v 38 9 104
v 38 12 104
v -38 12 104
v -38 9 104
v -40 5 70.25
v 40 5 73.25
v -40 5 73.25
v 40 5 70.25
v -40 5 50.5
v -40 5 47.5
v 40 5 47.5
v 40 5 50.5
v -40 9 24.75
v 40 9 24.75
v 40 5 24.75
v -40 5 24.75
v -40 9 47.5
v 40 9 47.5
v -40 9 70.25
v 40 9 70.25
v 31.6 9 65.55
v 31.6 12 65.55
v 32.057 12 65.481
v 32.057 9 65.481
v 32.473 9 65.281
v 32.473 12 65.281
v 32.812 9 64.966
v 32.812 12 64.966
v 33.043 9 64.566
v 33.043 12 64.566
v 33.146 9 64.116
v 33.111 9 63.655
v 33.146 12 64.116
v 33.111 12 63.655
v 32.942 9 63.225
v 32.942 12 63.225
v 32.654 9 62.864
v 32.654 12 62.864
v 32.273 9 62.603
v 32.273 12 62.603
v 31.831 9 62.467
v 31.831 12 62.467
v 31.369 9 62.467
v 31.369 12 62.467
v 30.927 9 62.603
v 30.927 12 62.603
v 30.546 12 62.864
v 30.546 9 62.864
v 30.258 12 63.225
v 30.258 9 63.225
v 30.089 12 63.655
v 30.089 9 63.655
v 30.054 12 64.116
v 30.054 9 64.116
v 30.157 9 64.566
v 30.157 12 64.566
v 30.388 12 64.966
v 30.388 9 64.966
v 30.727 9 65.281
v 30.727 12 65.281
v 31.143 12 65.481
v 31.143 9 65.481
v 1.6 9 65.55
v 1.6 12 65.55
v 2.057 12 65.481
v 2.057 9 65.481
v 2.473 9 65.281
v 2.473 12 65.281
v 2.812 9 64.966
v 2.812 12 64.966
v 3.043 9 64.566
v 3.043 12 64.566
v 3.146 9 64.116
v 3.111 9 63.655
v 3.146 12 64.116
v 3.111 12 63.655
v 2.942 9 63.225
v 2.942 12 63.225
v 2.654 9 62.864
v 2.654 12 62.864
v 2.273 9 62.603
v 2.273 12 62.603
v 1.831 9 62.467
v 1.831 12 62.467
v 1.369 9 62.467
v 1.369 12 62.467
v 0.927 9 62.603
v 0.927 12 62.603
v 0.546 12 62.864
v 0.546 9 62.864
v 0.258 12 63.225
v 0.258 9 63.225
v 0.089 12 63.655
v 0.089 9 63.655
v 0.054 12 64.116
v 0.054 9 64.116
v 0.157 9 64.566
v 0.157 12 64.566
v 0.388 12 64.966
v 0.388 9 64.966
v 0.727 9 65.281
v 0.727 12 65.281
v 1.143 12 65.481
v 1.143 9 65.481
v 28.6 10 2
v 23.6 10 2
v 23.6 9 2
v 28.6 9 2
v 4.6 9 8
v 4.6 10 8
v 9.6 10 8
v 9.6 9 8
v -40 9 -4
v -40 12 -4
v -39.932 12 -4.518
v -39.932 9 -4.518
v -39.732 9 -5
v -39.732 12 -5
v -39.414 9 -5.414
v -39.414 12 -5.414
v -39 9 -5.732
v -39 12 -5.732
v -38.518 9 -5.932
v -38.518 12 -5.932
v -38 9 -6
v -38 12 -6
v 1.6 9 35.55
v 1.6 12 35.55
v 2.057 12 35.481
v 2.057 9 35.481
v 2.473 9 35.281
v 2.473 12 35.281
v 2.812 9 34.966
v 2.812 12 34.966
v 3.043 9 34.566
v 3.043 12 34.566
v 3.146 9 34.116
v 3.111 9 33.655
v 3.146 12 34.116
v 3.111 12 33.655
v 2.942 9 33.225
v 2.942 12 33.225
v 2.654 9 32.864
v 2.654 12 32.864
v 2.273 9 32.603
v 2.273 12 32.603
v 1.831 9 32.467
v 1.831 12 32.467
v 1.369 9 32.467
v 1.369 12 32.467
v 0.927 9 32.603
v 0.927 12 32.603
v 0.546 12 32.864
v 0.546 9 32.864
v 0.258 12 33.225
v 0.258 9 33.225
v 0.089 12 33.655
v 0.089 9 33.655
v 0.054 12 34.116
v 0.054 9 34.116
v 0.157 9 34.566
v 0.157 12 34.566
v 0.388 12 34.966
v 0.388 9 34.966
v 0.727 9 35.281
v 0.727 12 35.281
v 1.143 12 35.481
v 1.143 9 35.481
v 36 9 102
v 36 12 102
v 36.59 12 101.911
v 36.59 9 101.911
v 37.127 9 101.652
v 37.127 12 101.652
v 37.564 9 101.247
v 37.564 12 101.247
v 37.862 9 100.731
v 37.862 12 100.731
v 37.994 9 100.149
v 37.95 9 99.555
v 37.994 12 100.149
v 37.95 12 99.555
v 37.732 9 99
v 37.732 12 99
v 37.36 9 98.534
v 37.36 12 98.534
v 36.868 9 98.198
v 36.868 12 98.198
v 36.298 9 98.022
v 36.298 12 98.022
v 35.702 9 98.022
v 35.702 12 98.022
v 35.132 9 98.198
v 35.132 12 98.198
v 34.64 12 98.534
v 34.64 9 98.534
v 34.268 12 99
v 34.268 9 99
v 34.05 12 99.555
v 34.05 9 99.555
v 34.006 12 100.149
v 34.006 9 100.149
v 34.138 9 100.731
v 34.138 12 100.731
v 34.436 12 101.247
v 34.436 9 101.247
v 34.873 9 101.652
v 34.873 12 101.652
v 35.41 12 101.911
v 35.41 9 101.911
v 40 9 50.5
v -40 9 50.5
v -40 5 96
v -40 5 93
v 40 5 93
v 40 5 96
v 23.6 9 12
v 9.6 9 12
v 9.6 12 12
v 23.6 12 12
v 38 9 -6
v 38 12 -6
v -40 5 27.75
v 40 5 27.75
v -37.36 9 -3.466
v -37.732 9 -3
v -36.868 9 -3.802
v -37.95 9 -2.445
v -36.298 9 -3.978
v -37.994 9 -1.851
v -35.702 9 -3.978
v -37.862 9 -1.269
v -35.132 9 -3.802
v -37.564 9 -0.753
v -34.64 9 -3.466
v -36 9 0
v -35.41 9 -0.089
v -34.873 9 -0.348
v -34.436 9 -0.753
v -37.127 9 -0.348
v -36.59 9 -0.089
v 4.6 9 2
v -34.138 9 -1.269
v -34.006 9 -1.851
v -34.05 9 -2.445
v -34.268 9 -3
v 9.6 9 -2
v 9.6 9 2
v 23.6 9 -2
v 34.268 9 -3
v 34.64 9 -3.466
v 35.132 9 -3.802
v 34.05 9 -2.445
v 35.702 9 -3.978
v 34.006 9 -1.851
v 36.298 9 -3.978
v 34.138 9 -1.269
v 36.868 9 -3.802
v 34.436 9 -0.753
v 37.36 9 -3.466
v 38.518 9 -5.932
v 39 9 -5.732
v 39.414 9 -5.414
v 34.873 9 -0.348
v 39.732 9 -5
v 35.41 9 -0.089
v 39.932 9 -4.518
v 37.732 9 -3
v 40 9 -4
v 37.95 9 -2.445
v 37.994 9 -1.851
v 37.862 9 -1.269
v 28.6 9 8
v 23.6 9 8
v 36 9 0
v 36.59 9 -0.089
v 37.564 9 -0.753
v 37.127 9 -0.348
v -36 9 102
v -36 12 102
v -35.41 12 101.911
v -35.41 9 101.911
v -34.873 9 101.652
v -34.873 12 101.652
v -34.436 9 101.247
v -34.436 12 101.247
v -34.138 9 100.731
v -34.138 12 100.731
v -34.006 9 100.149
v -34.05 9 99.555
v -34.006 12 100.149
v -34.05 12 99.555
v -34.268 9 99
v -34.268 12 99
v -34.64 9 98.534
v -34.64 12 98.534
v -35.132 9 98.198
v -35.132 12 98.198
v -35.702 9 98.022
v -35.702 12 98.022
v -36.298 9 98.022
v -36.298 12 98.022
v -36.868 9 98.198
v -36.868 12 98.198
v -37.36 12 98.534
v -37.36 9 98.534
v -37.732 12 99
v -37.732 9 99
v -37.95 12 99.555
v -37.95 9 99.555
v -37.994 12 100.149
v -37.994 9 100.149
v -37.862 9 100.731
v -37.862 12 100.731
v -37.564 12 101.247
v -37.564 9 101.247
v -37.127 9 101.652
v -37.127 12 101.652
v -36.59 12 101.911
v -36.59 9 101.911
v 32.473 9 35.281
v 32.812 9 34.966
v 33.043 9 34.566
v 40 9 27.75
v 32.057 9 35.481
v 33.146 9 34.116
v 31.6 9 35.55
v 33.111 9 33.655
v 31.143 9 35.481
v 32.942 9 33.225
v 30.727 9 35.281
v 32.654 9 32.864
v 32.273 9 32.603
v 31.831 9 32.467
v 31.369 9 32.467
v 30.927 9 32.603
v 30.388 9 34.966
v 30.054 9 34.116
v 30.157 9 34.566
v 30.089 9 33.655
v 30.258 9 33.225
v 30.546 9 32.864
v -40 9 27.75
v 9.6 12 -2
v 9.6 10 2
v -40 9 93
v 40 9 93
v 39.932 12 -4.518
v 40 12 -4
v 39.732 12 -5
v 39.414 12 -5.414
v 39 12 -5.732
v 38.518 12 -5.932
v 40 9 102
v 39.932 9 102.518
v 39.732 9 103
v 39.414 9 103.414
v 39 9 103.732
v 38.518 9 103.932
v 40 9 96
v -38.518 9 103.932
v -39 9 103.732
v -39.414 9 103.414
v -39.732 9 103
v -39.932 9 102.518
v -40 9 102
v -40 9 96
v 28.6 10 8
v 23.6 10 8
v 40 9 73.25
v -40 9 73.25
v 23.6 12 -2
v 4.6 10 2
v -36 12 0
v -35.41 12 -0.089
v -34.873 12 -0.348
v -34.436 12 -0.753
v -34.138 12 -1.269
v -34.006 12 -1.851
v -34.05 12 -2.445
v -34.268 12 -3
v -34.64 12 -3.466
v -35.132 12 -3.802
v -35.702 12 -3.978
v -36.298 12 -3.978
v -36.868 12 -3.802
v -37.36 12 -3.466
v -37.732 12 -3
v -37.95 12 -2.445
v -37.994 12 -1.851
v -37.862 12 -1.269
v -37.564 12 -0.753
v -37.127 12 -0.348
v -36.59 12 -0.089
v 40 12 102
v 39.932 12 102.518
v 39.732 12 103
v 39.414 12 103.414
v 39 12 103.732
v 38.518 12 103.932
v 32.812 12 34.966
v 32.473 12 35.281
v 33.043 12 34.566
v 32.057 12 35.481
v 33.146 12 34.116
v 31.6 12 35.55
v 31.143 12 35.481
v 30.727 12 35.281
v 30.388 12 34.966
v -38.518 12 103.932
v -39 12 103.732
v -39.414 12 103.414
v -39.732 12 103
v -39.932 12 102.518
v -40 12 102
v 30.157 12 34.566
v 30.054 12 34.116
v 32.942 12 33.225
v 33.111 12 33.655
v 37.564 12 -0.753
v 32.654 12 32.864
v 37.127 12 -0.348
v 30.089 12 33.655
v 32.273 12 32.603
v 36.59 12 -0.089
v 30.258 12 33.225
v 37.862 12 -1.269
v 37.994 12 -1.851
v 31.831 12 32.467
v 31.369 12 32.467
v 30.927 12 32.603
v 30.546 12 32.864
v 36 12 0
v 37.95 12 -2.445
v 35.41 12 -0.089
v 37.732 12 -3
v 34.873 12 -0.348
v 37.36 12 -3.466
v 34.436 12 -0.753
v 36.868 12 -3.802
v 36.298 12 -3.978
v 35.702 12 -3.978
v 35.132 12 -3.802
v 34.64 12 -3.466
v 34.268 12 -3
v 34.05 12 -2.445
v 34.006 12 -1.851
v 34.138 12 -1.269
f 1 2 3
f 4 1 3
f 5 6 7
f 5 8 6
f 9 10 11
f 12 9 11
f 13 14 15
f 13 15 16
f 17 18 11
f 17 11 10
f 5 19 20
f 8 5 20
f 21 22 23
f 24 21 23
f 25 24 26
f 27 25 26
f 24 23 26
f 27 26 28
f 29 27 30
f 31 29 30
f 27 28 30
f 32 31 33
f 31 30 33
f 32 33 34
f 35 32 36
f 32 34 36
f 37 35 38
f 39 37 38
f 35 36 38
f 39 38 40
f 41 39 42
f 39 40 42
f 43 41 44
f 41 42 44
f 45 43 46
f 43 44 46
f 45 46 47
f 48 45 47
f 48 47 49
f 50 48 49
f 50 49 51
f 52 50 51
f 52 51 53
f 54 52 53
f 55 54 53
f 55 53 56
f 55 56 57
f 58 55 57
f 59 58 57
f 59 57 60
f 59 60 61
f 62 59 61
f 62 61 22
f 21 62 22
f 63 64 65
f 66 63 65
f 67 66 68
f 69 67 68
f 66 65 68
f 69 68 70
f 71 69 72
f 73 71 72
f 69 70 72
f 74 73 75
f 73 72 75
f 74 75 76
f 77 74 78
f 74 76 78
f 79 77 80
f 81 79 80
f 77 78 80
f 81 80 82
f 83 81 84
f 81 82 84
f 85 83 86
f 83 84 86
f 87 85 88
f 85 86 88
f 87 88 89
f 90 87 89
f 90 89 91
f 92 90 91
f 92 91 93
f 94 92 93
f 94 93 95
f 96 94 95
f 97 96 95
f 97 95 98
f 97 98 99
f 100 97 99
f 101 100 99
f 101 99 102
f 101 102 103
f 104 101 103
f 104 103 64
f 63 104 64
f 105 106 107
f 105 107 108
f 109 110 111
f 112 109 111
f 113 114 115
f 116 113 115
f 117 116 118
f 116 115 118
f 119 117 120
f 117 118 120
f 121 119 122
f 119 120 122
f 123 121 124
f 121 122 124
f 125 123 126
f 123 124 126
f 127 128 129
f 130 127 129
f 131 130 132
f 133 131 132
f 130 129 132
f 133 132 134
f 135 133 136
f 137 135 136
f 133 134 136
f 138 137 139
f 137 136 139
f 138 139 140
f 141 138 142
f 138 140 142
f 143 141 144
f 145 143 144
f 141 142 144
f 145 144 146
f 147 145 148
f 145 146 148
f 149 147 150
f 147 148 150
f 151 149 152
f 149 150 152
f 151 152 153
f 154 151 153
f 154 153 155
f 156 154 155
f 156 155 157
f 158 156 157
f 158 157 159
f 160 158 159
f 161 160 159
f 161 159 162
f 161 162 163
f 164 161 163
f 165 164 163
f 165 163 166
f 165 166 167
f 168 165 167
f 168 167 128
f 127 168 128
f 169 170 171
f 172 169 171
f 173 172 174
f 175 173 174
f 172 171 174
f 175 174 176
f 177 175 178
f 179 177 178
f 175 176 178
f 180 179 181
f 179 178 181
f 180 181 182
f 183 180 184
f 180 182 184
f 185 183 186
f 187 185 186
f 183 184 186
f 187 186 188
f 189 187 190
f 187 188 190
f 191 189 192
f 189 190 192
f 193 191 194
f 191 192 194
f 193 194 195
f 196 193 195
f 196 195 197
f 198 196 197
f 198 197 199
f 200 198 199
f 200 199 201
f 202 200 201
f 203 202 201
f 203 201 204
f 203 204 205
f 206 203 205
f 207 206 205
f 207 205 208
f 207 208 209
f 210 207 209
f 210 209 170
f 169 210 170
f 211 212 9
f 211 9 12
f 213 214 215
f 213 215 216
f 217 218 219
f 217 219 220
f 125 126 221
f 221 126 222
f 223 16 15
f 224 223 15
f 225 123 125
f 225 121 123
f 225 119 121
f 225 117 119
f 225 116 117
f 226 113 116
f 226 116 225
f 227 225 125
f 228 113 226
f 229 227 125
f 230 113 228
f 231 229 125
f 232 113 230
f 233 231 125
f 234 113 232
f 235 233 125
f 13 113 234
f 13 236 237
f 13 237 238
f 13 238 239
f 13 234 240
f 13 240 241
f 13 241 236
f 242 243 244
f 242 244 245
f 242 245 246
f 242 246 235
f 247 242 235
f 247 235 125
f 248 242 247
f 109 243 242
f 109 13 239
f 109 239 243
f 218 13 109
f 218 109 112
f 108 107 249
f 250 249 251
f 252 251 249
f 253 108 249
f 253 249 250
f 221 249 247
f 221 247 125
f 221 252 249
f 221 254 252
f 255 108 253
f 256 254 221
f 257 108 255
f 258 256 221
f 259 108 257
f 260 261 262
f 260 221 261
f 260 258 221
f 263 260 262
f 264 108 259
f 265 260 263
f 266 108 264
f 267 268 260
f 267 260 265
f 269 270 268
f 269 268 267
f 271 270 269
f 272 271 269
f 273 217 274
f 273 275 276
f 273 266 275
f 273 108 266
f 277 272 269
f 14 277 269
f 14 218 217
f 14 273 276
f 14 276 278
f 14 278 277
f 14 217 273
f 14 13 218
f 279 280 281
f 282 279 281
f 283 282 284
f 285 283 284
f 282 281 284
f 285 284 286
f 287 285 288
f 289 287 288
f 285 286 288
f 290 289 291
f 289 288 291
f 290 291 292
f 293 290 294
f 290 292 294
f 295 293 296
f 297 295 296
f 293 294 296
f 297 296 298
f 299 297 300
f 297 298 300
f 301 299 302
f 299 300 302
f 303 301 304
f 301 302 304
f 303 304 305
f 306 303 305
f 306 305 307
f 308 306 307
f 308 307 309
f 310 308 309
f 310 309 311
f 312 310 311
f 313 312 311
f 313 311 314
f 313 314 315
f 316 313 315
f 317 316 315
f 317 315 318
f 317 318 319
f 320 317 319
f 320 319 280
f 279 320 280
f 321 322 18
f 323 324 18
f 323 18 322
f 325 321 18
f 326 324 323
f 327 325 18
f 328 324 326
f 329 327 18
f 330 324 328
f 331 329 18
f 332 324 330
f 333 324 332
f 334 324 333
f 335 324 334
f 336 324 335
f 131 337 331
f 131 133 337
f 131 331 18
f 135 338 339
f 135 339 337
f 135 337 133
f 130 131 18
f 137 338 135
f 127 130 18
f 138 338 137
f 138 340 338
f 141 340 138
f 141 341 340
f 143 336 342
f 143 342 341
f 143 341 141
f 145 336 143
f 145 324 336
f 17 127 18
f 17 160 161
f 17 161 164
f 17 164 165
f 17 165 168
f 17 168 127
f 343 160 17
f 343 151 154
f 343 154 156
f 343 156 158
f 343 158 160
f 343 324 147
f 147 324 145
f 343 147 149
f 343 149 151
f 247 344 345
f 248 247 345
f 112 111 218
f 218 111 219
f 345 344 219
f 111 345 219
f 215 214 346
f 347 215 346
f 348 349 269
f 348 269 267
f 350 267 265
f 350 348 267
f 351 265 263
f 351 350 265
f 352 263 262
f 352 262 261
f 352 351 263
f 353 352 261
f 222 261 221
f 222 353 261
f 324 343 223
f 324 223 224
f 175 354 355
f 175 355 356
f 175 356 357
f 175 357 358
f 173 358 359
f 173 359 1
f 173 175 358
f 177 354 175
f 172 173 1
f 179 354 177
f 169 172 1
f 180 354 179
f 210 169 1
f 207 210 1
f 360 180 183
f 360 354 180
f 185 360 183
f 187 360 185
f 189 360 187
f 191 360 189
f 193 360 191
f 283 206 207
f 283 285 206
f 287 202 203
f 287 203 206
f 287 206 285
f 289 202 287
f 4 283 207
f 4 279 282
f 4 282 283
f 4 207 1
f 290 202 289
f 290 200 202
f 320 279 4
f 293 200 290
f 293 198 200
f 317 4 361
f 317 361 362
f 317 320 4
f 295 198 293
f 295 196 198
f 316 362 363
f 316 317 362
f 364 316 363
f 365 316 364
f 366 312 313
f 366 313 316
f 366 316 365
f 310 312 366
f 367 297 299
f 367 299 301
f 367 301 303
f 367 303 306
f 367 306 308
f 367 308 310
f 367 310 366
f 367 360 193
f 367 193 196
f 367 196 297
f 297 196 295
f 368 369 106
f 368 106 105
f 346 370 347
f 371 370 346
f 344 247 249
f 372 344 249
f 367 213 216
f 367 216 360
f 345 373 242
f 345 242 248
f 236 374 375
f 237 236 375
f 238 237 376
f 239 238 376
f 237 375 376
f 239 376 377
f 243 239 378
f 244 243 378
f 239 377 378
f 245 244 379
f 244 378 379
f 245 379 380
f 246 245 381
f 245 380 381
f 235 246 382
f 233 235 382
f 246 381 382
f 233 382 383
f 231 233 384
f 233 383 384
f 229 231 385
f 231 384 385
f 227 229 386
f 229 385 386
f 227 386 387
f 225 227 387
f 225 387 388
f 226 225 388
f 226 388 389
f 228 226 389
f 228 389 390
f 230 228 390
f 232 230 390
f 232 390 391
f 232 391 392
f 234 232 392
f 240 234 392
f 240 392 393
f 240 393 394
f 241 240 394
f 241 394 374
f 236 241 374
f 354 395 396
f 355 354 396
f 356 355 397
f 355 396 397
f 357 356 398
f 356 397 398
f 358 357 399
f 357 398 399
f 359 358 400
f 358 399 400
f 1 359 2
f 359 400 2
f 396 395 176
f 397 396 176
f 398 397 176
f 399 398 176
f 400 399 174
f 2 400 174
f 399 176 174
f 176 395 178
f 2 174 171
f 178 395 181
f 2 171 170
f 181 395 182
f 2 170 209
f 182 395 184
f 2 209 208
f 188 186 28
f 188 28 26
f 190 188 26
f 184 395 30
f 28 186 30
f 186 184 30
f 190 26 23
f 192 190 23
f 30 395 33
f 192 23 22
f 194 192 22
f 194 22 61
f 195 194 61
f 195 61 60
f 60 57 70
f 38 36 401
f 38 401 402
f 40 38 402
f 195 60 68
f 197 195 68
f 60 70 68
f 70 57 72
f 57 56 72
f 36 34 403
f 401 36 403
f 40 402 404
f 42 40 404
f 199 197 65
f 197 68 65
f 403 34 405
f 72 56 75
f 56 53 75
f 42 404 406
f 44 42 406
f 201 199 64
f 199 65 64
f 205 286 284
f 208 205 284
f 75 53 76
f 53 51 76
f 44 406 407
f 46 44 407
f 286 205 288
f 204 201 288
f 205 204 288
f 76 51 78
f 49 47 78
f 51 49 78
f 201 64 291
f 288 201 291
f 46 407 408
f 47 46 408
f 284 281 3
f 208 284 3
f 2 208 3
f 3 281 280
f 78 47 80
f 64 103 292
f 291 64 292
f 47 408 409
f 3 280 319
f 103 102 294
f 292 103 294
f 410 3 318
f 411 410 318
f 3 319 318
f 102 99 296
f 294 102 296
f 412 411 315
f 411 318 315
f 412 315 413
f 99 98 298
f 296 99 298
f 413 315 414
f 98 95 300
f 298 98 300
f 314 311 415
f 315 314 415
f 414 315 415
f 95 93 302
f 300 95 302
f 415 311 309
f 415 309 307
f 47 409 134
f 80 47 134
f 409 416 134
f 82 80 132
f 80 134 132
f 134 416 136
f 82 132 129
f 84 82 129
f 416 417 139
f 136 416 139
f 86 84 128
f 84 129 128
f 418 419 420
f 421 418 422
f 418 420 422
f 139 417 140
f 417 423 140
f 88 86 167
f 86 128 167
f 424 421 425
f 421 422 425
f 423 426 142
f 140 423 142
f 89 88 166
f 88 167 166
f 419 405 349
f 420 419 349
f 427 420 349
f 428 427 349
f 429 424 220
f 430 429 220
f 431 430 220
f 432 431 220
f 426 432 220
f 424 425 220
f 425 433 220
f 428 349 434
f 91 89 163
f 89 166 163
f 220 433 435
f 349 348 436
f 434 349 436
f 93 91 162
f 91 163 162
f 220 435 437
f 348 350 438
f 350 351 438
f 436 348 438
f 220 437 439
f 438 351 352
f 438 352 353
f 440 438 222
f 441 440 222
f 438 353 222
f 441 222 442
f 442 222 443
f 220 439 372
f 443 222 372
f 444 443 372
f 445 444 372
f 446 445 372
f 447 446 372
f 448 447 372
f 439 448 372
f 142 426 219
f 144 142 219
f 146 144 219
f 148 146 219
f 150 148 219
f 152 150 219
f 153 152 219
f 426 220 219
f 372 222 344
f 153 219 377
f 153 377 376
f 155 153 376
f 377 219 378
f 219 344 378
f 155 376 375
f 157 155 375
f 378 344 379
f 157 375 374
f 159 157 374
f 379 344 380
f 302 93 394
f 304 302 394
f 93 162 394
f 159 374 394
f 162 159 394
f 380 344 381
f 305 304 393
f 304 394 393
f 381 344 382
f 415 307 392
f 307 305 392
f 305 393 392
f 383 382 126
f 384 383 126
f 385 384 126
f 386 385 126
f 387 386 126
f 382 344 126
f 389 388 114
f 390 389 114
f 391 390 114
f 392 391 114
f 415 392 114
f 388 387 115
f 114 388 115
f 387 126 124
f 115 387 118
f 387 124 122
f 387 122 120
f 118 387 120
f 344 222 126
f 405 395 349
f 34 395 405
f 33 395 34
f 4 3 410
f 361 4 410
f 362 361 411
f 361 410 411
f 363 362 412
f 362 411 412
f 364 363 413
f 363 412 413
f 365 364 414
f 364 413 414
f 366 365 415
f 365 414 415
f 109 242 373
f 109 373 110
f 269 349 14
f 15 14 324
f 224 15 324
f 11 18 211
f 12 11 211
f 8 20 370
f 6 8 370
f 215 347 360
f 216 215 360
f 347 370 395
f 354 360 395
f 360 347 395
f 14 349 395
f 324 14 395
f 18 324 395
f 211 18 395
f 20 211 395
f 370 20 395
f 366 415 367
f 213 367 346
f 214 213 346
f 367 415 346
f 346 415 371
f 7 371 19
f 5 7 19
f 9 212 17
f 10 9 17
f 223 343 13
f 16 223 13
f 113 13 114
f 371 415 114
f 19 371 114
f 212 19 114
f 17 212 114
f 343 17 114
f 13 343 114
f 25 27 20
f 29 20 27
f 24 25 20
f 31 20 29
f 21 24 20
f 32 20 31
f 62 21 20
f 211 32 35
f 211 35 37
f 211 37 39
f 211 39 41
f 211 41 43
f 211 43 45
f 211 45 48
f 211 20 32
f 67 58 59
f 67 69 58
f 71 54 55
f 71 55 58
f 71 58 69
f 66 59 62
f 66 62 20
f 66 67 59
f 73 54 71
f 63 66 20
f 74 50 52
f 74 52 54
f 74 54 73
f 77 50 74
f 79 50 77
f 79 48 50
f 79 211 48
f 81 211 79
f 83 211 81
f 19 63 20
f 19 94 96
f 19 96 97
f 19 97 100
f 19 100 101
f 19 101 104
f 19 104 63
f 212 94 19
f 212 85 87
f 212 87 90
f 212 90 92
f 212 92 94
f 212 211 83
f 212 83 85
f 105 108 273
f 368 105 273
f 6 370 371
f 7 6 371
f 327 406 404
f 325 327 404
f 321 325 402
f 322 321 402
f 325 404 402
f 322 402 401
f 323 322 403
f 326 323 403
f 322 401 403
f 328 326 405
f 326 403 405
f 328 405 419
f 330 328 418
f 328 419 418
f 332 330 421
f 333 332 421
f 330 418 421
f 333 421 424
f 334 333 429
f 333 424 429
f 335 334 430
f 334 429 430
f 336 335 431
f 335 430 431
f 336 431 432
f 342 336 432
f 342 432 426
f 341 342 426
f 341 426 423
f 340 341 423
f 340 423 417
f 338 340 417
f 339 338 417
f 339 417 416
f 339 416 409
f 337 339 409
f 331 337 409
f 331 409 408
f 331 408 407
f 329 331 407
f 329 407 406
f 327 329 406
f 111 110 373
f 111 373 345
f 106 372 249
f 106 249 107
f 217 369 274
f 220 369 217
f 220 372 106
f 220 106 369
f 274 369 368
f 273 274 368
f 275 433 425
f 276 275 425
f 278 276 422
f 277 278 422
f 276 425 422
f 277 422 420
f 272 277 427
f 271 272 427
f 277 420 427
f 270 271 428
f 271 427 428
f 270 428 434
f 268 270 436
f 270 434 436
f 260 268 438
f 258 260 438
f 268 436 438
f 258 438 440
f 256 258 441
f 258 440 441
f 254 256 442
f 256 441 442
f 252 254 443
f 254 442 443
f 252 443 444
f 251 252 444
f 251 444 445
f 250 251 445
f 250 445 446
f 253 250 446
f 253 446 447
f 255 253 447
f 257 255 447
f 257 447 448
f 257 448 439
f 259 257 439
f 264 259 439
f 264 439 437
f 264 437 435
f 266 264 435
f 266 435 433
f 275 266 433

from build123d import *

# Parameters (mm, degrees)
EXTRUDE_1_DEPTH      = 12
CUT_EXTRUDE_1_DEPTH  = 12
SKETCH_3_R           = 2
CUT_EXTRUDE_2_DEPTH  = 12
CUT_EXTRUDE_3_DEPTH  = 1
SKETCH_5_W           = 80
SKETCH_5_H           = 4
CUT_EXTRUDE_4_DEPTH  = 20
EXTRUDE_2_DEPTH      = 1
SKETCH_7_W           = 0.2
SKETCH_7_H           = 8
CUT_EXTRUDE_5_DEPTH  = 1
SKETCH_8_R           = 2
EXTRUDE_3_DEPTH      = 4
SKETCH_9_W           = 80
SKETCH_9_H           = 9
CUT_EXTRUDE_6_DEPTH  = 14
SKETCH_10_W          = 9.44
SKETCH_10_H          = 1
CUT_EXTRUDE_7_DEPTH  = 14
SKETCH_11_W          = 9.44
SKETCH_11_H          = 1
EXTRUDE_4_DEPTH      = 8
CUT_EXTRUDE_8_DEPTH  = 8
SKETCH_13_W          = 80
SKETCH_13_H          = 3
EXTRUDE_5_DEPTH      = 7
SKETCH_14_R          = 1.6
EXTRUDE_7_DEPTH      = 3
SKETCH_16_W          = 3
SKETCH_16_H          = 4
EXTRUDE_8_DEPTH      = 80
SKETCH_17_R          = 1.55
CUT_EXTRUDE_11_DEPTH = 7
SKETCH_21_R          = 2
CUT_EXTRUDE_12_DEPTH = 7
EXTRUDE_9_DEPTH      = 4
SKETCH_23_W          = 3
SKETCH_23_H          = 4
CUT_EXTRUDE_13_DEPTH = 200
CUT_EXTRUDE_15_DEPTH = 5
SKETCH_25_W          = 9.44
SKETCH_25_H          = 4
CUT_EXTRUDE_16_DEPTH = 5
SKETCH_26_W          = 9.44
SKETCH_26_H          = 4
EXTRUDE_10_DEPTH     = 2
SKETCH_27_W          = 9.44
SKETCH_27_H          = 4
EXTRUDE_11_DEPTH     = 1
SKETCH_28_W          = 5
SKETCH_28_H          = 14
CUT_EXTRUDE_17_DEPTH = 1
SKETCH_29_W          = 5
SKETCH_29_H          = 4
EXTRUDE_12_DEPTH     = 1


with BuildPart() as part:
    # 草图1 → 凸台-拉伸1 (new body)
    with BuildSketch(Plane(origin=(0, 0, 0), x_dir=(1, 0, 0), z_dir=(0, 1, 0))):
        Polygon((-40, -6), (0, -6), (40, -6), (40, 0), (40, 6), (0, 6), (-36, 6), (-40, 6), align=None)
    extrude(amount=EXTRUDE_1_DEPTH)

    # 草图2 → 切除-拉伸1 (cut)
    with BuildSketch(Plane.XY.offset(6)):
        Polygon((-28, 0), (0, 0), (28, 0), (28, 4), (28, 8), (-28, 8), (-28, 4), align=None)
        Polygon((-40, 4), (-32, 4), (-32, 8), (-32, 12), (-40, 12), align=None)
        Polygon((32, 8), (32, 4), (40, 4), (40, 12), (32, 12), align=None)
    extrude(amount=-CUT_EXTRUDE_1_DEPTH, mode=Mode.SUBTRACT)

    # 草图3 → 切除-拉伸2 (cut)
    with BuildSketch(Plane(origin=(0, 12, 0), x_dir=(1, 0, 0), z_dir=(0, 1, 0))):
        with BuildLine():
            Line((-40, 6), (-40, 4))
            ThreePointArc((-40, 4), (-39.414213562, 5.414213562), (-38, 6))
            Line((-38, 6), (-40, 6))
        make_face()
        with Locations(Location((-36, 2, 0), (0, 0, 270))):
            Circle(SKETCH_3_R)
        with BuildLine():
            ThreePointArc((40, 4), (39.414213562, 5.414213562), (38, 6))
            Line((38, 6), (40, 6))
            Line((40, 6), (40, 4))
        make_face()
        with Locations(Location((36, 2, 0), (0, 0, 270))):
            Circle(SKETCH_3_R)
    extrude(amount=-CUT_EXTRUDE_2_DEPTH, mode=Mode.SUBTRACT)

    # 草图4 → 切除-拉伸3 (cut)
    with BuildSketch(Plane(origin=(0, 12, 0), x_dir=(1, 0, 0), z_dir=(0, 1, 0))):
        Polygon((-21.1, 0), (-21.1, 6), (-16.6, 6), (-12.1, 6), (12.08, 6), (16.6, 6), (21.12, 6), (21.12, -1), (21.12, -6), (16.6, -6), (12.08, -6), (12.08, -1), (12.08, 0), (-12.1, 0), (-12.1, -6), (-16.6, -6), (-21.1, -6), align=None)
    extrude(amount=-CUT_EXTRUDE_3_DEPTH, mode=Mode.SUBTRACT)

    # 草图5 → 切除-拉伸4 (cut)
    with BuildSketch(Plane(origin=(0, 12, 0), x_dir=(1, 0, 0), z_dir=(0, 1, 0))):
        with Locations((0, -4)):
            Rectangle(SKETCH_5_W, SKETCH_5_H)
    extrude(amount=-CUT_EXTRUDE_4_DEPTH, mode=Mode.SUBTRACT)

    # 草图6 → 凸台-拉伸2 (add)
    with BuildSketch(Plane(origin=(0, 12, 0), x_dir=(1, 0, 0), z_dir=(0, 1, 0))):
        Polygon((12.08, 0), (12.08, 6), (-21.1, 6), (-21.1, -2), (-12.1, -2), (-12.1, 0), align=None)
    extrude(amount=-EXTRUDE_2_DEPTH)

    # 草图7 → 切除-拉伸5 (cut)
    with BuildSketch(Plane(origin=(0, 12, 0), x_dir=(1, 0, 0), z_dir=(0, 1, 0))):
        with Locations((21.22, 2)):
            Rectangle(SKETCH_7_W, SKETCH_7_H)
        with Locations((11.98, 2)):
            Rectangle(SKETCH_7_W, SKETCH_7_H)
    extrude(amount=-CUT_EXTRUDE_5_DEPTH, mode=Mode.SUBTRACT)

    # 草图8 → 凸台-拉伸3 (add)
    # profile 1 of 2: a face of its own
    with BuildSketch(Plane(origin=(0, 12, 0), x_dir=(1, 0, 0), z_dir=(0, 1, 0))):
        with BuildLine():
            Line((-32, -2), (-40, -2))
            Line((-40, -2), (-40, 4))
            ThreePointArc((-40, 4), (-39.414213562, 5.414213562), (-38, 6))
            Line((-38, 6), (-32, 6))
            Line((-32, 6), (-32, -2))
        make_face()
        with Locations(Location((-36, 2, 0), (0, 0, 270))):
            Circle(SKETCH_8_R, mode=Mode.SUBTRACT)
    # profile 2 of 2: a face of its own
    with BuildSketch(Plane(origin=(0, 12, 0), x_dir=(1, 0, 0), z_dir=(0, 1, 0))):
        with BuildLine():
            Line((32, -2), (40, -2))
            Line((40, -2), (40, 4))
            ThreePointArc((40, 4), (39.414213562, 5.414213562), (38, 6))
            Line((38, 6), (32, 6))
            Line((32, 6), (32, -2))
        make_face()
        with Locations(Location((36, 2, 0), (0, 0, 270))):
            Circle(SKETCH_8_R, mode=Mode.SUBTRACT)
    extrude(amount=-EXTRUDE_3_DEPTH)

    # 草图9 → 切除-拉伸6 (cut)
    with BuildSketch(Plane.XY.offset(2)):
        with Locations((0, 4.5)):
            Rectangle(SKETCH_9_W, SKETCH_9_H)
    extrude(amount=-CUT_EXTRUDE_6_DEPTH, mode=Mode.SUBTRACT)

    # 草图10 → 切除-拉伸7 (cut)
    with BuildSketch(Plane(origin=(0, 0, -6), x_dir=(-1, 0, 0), z_dir=(0, 0, -1))):
        with Locations((-16.6, 9.5)):
            Rectangle(SKETCH_10_W, SKETCH_10_H)
    extrude(amount=-CUT_EXTRUDE_7_DEPTH, mode=Mode.SUBTRACT)

    # 草图11 → 凸台-拉伸4 (add)
    with BuildSketch(Plane(origin=(0, 0, -6), x_dir=(-1, 0, 0), z_dir=(0, 0, -1))):
        with Locations((-16.6, 11.5)):
            Rectangle(SKETCH_11_W, SKETCH_11_H)
    extrude(amount=-EXTRUDE_4_DEPTH)

    # 草图12 → 切除-拉伸8 (cut)
    with BuildSketch(Plane.XZ.offset(-9)):
        with BuildLine():
            ThreePointArc((21.05, -2.72), (18.302941274, 1.39126392), (13.453374824, 0.426625176))
            Line((13.453374824, 0.426625176), (19.746625176, -5.866625176))
            ThreePointArc((19.746625176, -5.866625176), (20.71126392, -4.422941274), (21.05, -2.72))
        make_face()
        with BuildLine():
            Line((19.746625176, -5.866625176), (13.453374824, 0.426625176))
            ThreePointArc((13.453374824, 0.426625176), (13.453374824, -5.866625176), (19.746625176, -5.866625176))
        make_face()
    extrude(amount=-CUT_EXTRUDE_8_DEPTH, mode=Mode.SUBTRACT)

    # 草图13 → 凸台-拉伸5 (add)
    with BuildSketch(Plane(origin=(0, 12, 0), x_dir=(1, 0, 0), z_dir=(0, 1, 0))):
        with Locations((0, -3.5)):
            Rectangle(SKETCH_13_W, SKETCH_13_H)
    extrude(amount=-EXTRUDE_5_DEPTH)

    # 草图14 → 凸台-拉伸7 (add)
    with BuildSketch(Plane(origin=(0, 12, 0), x_dir=(1, 0, 0), z_dir=(0, 1, 0))):
        with BuildLine():
            Line((-40, -100), (-40, -5))
            Line((-40, -5), (40, -5))
            Line((40, -5), (40, -100))
            Line((40, -100), (40, -102))
            ThreePointArc((40, -102), (39.414213562, -103.414213562), (38, -104))
            Line((38, -104), (36, -104))
            Line((36, -104), (-36, -104))
            Line((-36, -104), (-38, -104))
            ThreePointArc((-38, -104), (-39.414213562, -103.414213562), (-40, -102))
            Line((-40, -102), (-40, -100))
        make_face()
        with Locations(Location((-36, -100, 0), (0, 0, 270))):
            Circle(SKETCH_14_R, mode=Mode.SUBTRACT)
        with Locations(Location((36, -100, 0), (0, 0, 270))):
            Circle(SKETCH_14_R, mode=Mode.SUBTRACT)
    extrude(amount=-EXTRUDE_7_DEPTH)

    # 草图16 → 凸台-拉伸8 (add)
    with BuildSketch(Plane.ZY.offset(40)):
        with Locations((94.5, 7)):
            Rectangle(SKETCH_16_W, SKETCH_16_H)
    extrude(amount=-EXTRUDE_8_DEPTH)

    # 草图17 → 切除-拉伸11 (cut)
    with BuildSketch(Plane(origin=(0, 12, 0), x_dir=(1, 0, 0), z_dir=(0, 1, 0))):
        with Locations(Location((1.6, -34, 0), (0, 0, 270))):
            Circle(SKETCH_17_R)
        with Locations(Location((31.6, -34, 0), (0, 0, 270))):
            Circle(SKETCH_17_R)
        with Locations(Location((31.6, -64, 0), (0, 0, 270))):
            Circle(SKETCH_17_R)
        with Locations(Location((1.6, -64, 0), (0, 0, 270))):
            Circle(SKETCH_17_R)
    extrude(amount=-CUT_EXTRUDE_11_DEPTH, mode=Mode.SUBTRACT)

    # 草图21 → 切除-拉伸12 (cut)
    with BuildSketch(Plane(origin=(0, 12, 0), x_dir=(1, 0, 0), z_dir=(0, 1, 0))):
        with Locations(Location((-36, -100, 0), (0, 0, 270))):
            Circle(SKETCH_21_R)
        with Locations(Location((36, -100, 0), (0, 0, 270))):
            Circle(SKETCH_21_R)
    extrude(amount=-CUT_EXTRUDE_12_DEPTH, mode=Mode.SUBTRACT)

    # 草图22 → 凸台-拉伸9 (add)
    with BuildSketch(Plane(origin=(0, 9, 0), x_dir=(-1, 0, 0), z_dir=(0, -1, 0))):
        Polygon((40, -49), (40, -50.5), (-40, -50.5), (-40, -49), (-40, -47.5), (40, -47.5), align=None)
        Polygon((40, -26.25), (40, -27.75), (-40, -27.75), (-40, -24.75), (40, -24.75), align=None)
        Polygon((-40, -71.75), (-40, -73.25), (40, -73.25), (40, -70.25), (-40, -70.25), align=None)
    extrude(amount=EXTRUDE_9_DEPTH)

    # 草图23 → 切除-拉伸13 (cut)
    with BuildSketch(Plane.ZY.offset(40)):
        with Locations((3.5, 7)):
            Rectangle(SKETCH_23_W, SKETCH_23_H)
    extrude(amount=-CUT_EXTRUDE_13_DEPTH, mode=Mode.SUBTRACT)

    # 草图24 → 切除-拉伸15 (cut)
    with BuildSketch(Plane.XZ.offset(-9)):
        Polygon((11.88, -2), (11.88, 2), (16.6, 2), (16.6, 12), (9.6, 12), (9.6, -2), align=None)
        Polygon((16.6, 12), (16.6, 2), (21.32, 2), (21.32, -2), (23.6, -2), (23.6, 12), align=None)
    extrude(amount=-CUT_EXTRUDE_15_DEPTH, mode=Mode.SUBTRACT)

    # 草图25 → 切除-拉伸16 (cut)
    with BuildSketch(Plane(origin=(0, 10, 0), x_dir=(-1, 0, 0), z_dir=(0, -1, 0))):
        with Locations((-16.6, 0)):
            Rectangle(SKETCH_25_W, SKETCH_25_H)
    extrude(amount=-CUT_EXTRUDE_16_DEPTH, mode=Mode.SUBTRACT)

    # 草图26 → 凸台-拉伸10 (add)
    with BuildSketch(Plane(origin=(0, 10, 0), x_dir=(-1, 0, 0), z_dir=(0, -1, 0))):
        with Locations((-16.6, 4)):
            Rectangle(SKETCH_26_W, SKETCH_26_H)
    extrude(amount=-EXTRUDE_10_DEPTH)

    # 草图27 → 凸台-拉伸11 (add)
    with BuildSketch(Plane.XZ.offset(-10)):
        with Locations((16.6, -4)):
            Rectangle(SKETCH_27_W, SKETCH_27_H)
    extrude(amount=EXTRUDE_11_DEPTH)

    # 草图28 → 切除-拉伸17 (cut)
    with BuildSketch(Plane.XZ.offset(-9)):
        with Locations((7.1, 5)):
            Rectangle(SKETCH_28_W, SKETCH_28_H)
        with Locations((26.1, 5)):
            Rectangle(SKETCH_28_W, SKETCH_28_H)
    extrude(amount=-CUT_EXTRUDE_17_DEPTH, mode=Mode.SUBTRACT)

    # 草图29 → 凸台-拉伸12 (add)
    with BuildSketch(Plane.XZ.offset(-10)):
        with Locations((7.1, 0)):
            Rectangle(SKETCH_29_W, SKETCH_29_H)
        with Locations((26.1, 10)):
            Rectangle(SKETCH_29_W, SKETCH_29_H)
        with Locations((26.1, 0)):
            Rectangle(SKETCH_29_W, SKETCH_29_H)
        with Locations((7.1, 10)):
            Rectangle(SKETCH_29_W, SKETCH_29_H)
    extrude(amount=EXTRUDE_12_DEPTH)


solid = part.part
